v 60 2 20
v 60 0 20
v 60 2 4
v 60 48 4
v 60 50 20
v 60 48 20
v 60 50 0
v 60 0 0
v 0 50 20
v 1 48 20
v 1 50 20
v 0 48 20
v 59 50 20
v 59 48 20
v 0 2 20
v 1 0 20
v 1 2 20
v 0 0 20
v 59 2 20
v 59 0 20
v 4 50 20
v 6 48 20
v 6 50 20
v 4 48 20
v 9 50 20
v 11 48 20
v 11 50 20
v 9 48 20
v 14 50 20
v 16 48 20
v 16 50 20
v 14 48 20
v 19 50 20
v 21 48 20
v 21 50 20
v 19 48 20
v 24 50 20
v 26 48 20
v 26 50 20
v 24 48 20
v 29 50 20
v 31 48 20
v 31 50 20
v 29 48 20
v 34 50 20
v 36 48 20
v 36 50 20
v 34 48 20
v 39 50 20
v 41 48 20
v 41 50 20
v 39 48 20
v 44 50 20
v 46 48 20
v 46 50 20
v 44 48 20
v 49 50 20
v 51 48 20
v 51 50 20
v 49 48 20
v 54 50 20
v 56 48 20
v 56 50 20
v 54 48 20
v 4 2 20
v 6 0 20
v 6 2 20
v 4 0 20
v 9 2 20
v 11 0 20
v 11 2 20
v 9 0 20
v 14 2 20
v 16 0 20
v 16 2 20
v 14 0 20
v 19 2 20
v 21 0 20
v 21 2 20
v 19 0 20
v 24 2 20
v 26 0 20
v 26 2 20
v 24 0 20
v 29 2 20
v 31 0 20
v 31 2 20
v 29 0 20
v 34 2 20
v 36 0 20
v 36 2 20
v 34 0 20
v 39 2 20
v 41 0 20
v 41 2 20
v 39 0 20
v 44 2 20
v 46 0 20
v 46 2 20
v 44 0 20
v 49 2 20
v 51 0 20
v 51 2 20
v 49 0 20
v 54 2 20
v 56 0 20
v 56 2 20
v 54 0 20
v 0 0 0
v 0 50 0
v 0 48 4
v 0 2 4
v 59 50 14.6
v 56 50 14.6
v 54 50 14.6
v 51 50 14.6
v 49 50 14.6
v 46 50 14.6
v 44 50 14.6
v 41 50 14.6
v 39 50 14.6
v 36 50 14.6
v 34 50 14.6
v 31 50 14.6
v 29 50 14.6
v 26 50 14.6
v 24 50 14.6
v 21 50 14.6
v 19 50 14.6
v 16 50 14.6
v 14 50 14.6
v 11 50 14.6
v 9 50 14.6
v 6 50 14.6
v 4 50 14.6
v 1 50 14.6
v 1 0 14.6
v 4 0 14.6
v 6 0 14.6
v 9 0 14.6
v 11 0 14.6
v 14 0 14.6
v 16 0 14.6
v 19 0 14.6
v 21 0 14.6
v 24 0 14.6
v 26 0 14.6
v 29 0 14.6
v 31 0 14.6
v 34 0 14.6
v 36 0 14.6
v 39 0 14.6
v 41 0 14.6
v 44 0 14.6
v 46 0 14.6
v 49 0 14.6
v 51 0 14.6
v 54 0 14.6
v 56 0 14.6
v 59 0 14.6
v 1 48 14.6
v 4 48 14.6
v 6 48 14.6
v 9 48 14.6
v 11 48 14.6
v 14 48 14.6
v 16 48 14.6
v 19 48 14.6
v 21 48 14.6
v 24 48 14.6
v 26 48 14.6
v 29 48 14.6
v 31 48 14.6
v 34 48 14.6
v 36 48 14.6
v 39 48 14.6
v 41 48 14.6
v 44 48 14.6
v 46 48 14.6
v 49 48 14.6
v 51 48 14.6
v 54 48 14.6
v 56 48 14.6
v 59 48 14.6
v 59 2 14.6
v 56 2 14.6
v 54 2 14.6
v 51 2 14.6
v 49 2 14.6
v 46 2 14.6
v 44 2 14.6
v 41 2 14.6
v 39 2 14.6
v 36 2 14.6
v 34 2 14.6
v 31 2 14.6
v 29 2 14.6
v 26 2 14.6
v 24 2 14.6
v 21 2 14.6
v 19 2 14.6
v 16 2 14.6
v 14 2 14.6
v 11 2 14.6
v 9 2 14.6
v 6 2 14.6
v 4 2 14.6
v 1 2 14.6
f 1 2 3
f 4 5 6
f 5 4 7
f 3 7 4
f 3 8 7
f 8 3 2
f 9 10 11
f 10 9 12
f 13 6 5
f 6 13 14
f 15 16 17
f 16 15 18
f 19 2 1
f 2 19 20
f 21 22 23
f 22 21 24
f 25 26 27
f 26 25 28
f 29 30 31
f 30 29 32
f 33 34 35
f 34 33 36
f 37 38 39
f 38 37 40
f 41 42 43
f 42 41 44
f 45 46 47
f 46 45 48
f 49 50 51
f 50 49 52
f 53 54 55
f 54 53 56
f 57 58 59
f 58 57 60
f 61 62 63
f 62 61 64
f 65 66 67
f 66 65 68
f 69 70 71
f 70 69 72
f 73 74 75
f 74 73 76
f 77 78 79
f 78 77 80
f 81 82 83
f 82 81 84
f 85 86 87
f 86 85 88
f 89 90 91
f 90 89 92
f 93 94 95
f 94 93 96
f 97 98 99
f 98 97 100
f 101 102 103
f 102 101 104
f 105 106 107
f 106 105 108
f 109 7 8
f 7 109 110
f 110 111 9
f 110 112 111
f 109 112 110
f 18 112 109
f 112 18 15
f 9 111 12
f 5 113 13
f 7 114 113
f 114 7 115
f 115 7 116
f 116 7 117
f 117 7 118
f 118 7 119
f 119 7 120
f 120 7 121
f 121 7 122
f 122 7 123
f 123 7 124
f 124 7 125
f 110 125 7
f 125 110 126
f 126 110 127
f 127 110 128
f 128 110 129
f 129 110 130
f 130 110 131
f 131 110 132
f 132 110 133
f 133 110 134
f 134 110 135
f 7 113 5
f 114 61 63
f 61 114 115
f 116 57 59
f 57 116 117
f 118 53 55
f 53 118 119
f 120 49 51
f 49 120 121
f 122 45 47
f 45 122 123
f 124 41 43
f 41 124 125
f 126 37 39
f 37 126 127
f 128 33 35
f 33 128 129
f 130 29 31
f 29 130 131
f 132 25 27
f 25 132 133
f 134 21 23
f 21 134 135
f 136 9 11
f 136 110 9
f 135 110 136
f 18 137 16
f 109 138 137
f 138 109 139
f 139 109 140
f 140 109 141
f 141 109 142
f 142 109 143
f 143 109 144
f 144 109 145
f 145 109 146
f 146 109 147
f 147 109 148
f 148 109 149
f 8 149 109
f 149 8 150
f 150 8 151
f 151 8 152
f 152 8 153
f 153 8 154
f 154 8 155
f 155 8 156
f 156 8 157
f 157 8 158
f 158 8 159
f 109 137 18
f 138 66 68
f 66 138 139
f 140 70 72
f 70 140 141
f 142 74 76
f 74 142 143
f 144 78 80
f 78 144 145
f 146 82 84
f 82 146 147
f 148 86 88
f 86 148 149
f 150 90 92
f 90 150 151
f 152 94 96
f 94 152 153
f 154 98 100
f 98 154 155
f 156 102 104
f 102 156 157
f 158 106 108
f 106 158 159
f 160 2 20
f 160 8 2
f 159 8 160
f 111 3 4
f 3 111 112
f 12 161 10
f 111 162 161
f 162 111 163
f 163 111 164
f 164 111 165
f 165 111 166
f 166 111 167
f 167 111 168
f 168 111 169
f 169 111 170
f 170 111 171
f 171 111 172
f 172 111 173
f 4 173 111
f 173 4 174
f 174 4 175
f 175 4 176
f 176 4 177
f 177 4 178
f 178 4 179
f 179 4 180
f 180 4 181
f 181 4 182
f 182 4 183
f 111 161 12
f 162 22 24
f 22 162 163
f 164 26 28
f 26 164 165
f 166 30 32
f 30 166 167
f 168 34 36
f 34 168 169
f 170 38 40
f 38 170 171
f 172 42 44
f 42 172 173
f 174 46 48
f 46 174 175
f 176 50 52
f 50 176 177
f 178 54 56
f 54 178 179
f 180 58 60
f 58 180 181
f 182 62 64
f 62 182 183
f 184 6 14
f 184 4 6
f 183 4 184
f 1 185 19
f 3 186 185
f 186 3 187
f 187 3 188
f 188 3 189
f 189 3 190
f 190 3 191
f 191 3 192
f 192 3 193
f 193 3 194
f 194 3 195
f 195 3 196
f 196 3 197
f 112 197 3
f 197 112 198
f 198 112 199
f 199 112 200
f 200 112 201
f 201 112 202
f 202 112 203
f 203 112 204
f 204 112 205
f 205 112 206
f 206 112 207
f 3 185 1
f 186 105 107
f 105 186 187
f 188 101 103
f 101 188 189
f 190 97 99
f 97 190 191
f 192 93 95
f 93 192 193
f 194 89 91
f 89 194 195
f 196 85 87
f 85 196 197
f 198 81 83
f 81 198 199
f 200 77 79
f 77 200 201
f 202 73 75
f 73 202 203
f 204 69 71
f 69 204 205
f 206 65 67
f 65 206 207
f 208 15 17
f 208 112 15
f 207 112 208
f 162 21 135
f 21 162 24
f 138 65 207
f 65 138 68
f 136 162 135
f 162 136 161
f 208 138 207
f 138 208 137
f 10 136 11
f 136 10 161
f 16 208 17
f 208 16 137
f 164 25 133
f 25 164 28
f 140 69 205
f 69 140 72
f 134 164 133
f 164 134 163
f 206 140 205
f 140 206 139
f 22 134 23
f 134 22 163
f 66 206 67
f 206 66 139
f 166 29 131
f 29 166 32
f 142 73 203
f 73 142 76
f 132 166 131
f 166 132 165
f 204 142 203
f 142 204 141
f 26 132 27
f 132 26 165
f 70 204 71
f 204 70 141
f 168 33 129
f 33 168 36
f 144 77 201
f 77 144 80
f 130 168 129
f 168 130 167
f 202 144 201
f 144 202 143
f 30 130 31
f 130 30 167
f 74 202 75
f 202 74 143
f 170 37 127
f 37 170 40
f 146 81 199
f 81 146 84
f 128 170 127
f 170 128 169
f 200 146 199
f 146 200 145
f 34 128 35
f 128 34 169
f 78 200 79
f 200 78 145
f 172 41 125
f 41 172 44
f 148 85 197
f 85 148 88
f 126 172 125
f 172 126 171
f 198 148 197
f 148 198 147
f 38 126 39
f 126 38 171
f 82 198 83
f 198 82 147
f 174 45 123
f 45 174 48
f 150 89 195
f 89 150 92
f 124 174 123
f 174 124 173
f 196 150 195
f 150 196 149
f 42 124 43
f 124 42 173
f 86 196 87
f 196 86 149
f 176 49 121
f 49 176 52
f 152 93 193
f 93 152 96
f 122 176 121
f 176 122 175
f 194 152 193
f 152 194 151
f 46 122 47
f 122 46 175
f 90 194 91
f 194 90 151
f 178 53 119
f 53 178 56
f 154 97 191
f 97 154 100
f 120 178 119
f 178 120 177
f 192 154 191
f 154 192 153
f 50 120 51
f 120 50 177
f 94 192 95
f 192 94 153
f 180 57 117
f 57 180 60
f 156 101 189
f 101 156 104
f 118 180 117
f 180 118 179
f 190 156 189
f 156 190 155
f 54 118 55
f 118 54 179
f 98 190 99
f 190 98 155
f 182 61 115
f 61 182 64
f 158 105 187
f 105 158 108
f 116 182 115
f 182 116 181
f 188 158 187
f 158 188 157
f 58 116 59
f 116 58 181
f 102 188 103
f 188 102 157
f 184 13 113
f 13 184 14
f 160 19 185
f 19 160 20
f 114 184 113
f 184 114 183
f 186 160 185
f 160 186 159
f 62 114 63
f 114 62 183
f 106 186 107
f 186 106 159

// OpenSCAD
$fn = 32;

// ----------------------------------------------------------------------
// Cable duct: 60 x 50 x 20 mm, 12 fingers
// ----------------------------------------------------------------------

// --- parameters (mm) ---
channel_l = 60;           // duct length, X
channel_w = 50;           // duct width, Y
channel_h = 20;           // duct height, Z
channel_t = 2;            // side wall thickness
floor_t = 4;              // floor thickness
slot_w = 3;               // finger slot width
slot_h = 10.6;            // finger slot height
fingers = 12;             // number of finger slots per side
pitch = 5;                // finger pitch

module shell() {
  difference() {
    cube([channel_l, channel_w, channel_h]);
    /* open top channel */
    translate([-channel_t - 1, channel_t, floor_t])
      cube([channel_l + 2 * channel_t + 2, channel_w - 2 * channel_t, channel_h + 1]);
  }
}

difference() {
  union() {
    shell();
  }
  /* finger slots cut through both side walls */
  for (i = [0 : fingers - 1]) translate([pitch / 2 + i * pitch - slot_w / 2, -1, floor_t + slot_h]) cube([slot_w, channel_w + 2, channel_h]);
}
